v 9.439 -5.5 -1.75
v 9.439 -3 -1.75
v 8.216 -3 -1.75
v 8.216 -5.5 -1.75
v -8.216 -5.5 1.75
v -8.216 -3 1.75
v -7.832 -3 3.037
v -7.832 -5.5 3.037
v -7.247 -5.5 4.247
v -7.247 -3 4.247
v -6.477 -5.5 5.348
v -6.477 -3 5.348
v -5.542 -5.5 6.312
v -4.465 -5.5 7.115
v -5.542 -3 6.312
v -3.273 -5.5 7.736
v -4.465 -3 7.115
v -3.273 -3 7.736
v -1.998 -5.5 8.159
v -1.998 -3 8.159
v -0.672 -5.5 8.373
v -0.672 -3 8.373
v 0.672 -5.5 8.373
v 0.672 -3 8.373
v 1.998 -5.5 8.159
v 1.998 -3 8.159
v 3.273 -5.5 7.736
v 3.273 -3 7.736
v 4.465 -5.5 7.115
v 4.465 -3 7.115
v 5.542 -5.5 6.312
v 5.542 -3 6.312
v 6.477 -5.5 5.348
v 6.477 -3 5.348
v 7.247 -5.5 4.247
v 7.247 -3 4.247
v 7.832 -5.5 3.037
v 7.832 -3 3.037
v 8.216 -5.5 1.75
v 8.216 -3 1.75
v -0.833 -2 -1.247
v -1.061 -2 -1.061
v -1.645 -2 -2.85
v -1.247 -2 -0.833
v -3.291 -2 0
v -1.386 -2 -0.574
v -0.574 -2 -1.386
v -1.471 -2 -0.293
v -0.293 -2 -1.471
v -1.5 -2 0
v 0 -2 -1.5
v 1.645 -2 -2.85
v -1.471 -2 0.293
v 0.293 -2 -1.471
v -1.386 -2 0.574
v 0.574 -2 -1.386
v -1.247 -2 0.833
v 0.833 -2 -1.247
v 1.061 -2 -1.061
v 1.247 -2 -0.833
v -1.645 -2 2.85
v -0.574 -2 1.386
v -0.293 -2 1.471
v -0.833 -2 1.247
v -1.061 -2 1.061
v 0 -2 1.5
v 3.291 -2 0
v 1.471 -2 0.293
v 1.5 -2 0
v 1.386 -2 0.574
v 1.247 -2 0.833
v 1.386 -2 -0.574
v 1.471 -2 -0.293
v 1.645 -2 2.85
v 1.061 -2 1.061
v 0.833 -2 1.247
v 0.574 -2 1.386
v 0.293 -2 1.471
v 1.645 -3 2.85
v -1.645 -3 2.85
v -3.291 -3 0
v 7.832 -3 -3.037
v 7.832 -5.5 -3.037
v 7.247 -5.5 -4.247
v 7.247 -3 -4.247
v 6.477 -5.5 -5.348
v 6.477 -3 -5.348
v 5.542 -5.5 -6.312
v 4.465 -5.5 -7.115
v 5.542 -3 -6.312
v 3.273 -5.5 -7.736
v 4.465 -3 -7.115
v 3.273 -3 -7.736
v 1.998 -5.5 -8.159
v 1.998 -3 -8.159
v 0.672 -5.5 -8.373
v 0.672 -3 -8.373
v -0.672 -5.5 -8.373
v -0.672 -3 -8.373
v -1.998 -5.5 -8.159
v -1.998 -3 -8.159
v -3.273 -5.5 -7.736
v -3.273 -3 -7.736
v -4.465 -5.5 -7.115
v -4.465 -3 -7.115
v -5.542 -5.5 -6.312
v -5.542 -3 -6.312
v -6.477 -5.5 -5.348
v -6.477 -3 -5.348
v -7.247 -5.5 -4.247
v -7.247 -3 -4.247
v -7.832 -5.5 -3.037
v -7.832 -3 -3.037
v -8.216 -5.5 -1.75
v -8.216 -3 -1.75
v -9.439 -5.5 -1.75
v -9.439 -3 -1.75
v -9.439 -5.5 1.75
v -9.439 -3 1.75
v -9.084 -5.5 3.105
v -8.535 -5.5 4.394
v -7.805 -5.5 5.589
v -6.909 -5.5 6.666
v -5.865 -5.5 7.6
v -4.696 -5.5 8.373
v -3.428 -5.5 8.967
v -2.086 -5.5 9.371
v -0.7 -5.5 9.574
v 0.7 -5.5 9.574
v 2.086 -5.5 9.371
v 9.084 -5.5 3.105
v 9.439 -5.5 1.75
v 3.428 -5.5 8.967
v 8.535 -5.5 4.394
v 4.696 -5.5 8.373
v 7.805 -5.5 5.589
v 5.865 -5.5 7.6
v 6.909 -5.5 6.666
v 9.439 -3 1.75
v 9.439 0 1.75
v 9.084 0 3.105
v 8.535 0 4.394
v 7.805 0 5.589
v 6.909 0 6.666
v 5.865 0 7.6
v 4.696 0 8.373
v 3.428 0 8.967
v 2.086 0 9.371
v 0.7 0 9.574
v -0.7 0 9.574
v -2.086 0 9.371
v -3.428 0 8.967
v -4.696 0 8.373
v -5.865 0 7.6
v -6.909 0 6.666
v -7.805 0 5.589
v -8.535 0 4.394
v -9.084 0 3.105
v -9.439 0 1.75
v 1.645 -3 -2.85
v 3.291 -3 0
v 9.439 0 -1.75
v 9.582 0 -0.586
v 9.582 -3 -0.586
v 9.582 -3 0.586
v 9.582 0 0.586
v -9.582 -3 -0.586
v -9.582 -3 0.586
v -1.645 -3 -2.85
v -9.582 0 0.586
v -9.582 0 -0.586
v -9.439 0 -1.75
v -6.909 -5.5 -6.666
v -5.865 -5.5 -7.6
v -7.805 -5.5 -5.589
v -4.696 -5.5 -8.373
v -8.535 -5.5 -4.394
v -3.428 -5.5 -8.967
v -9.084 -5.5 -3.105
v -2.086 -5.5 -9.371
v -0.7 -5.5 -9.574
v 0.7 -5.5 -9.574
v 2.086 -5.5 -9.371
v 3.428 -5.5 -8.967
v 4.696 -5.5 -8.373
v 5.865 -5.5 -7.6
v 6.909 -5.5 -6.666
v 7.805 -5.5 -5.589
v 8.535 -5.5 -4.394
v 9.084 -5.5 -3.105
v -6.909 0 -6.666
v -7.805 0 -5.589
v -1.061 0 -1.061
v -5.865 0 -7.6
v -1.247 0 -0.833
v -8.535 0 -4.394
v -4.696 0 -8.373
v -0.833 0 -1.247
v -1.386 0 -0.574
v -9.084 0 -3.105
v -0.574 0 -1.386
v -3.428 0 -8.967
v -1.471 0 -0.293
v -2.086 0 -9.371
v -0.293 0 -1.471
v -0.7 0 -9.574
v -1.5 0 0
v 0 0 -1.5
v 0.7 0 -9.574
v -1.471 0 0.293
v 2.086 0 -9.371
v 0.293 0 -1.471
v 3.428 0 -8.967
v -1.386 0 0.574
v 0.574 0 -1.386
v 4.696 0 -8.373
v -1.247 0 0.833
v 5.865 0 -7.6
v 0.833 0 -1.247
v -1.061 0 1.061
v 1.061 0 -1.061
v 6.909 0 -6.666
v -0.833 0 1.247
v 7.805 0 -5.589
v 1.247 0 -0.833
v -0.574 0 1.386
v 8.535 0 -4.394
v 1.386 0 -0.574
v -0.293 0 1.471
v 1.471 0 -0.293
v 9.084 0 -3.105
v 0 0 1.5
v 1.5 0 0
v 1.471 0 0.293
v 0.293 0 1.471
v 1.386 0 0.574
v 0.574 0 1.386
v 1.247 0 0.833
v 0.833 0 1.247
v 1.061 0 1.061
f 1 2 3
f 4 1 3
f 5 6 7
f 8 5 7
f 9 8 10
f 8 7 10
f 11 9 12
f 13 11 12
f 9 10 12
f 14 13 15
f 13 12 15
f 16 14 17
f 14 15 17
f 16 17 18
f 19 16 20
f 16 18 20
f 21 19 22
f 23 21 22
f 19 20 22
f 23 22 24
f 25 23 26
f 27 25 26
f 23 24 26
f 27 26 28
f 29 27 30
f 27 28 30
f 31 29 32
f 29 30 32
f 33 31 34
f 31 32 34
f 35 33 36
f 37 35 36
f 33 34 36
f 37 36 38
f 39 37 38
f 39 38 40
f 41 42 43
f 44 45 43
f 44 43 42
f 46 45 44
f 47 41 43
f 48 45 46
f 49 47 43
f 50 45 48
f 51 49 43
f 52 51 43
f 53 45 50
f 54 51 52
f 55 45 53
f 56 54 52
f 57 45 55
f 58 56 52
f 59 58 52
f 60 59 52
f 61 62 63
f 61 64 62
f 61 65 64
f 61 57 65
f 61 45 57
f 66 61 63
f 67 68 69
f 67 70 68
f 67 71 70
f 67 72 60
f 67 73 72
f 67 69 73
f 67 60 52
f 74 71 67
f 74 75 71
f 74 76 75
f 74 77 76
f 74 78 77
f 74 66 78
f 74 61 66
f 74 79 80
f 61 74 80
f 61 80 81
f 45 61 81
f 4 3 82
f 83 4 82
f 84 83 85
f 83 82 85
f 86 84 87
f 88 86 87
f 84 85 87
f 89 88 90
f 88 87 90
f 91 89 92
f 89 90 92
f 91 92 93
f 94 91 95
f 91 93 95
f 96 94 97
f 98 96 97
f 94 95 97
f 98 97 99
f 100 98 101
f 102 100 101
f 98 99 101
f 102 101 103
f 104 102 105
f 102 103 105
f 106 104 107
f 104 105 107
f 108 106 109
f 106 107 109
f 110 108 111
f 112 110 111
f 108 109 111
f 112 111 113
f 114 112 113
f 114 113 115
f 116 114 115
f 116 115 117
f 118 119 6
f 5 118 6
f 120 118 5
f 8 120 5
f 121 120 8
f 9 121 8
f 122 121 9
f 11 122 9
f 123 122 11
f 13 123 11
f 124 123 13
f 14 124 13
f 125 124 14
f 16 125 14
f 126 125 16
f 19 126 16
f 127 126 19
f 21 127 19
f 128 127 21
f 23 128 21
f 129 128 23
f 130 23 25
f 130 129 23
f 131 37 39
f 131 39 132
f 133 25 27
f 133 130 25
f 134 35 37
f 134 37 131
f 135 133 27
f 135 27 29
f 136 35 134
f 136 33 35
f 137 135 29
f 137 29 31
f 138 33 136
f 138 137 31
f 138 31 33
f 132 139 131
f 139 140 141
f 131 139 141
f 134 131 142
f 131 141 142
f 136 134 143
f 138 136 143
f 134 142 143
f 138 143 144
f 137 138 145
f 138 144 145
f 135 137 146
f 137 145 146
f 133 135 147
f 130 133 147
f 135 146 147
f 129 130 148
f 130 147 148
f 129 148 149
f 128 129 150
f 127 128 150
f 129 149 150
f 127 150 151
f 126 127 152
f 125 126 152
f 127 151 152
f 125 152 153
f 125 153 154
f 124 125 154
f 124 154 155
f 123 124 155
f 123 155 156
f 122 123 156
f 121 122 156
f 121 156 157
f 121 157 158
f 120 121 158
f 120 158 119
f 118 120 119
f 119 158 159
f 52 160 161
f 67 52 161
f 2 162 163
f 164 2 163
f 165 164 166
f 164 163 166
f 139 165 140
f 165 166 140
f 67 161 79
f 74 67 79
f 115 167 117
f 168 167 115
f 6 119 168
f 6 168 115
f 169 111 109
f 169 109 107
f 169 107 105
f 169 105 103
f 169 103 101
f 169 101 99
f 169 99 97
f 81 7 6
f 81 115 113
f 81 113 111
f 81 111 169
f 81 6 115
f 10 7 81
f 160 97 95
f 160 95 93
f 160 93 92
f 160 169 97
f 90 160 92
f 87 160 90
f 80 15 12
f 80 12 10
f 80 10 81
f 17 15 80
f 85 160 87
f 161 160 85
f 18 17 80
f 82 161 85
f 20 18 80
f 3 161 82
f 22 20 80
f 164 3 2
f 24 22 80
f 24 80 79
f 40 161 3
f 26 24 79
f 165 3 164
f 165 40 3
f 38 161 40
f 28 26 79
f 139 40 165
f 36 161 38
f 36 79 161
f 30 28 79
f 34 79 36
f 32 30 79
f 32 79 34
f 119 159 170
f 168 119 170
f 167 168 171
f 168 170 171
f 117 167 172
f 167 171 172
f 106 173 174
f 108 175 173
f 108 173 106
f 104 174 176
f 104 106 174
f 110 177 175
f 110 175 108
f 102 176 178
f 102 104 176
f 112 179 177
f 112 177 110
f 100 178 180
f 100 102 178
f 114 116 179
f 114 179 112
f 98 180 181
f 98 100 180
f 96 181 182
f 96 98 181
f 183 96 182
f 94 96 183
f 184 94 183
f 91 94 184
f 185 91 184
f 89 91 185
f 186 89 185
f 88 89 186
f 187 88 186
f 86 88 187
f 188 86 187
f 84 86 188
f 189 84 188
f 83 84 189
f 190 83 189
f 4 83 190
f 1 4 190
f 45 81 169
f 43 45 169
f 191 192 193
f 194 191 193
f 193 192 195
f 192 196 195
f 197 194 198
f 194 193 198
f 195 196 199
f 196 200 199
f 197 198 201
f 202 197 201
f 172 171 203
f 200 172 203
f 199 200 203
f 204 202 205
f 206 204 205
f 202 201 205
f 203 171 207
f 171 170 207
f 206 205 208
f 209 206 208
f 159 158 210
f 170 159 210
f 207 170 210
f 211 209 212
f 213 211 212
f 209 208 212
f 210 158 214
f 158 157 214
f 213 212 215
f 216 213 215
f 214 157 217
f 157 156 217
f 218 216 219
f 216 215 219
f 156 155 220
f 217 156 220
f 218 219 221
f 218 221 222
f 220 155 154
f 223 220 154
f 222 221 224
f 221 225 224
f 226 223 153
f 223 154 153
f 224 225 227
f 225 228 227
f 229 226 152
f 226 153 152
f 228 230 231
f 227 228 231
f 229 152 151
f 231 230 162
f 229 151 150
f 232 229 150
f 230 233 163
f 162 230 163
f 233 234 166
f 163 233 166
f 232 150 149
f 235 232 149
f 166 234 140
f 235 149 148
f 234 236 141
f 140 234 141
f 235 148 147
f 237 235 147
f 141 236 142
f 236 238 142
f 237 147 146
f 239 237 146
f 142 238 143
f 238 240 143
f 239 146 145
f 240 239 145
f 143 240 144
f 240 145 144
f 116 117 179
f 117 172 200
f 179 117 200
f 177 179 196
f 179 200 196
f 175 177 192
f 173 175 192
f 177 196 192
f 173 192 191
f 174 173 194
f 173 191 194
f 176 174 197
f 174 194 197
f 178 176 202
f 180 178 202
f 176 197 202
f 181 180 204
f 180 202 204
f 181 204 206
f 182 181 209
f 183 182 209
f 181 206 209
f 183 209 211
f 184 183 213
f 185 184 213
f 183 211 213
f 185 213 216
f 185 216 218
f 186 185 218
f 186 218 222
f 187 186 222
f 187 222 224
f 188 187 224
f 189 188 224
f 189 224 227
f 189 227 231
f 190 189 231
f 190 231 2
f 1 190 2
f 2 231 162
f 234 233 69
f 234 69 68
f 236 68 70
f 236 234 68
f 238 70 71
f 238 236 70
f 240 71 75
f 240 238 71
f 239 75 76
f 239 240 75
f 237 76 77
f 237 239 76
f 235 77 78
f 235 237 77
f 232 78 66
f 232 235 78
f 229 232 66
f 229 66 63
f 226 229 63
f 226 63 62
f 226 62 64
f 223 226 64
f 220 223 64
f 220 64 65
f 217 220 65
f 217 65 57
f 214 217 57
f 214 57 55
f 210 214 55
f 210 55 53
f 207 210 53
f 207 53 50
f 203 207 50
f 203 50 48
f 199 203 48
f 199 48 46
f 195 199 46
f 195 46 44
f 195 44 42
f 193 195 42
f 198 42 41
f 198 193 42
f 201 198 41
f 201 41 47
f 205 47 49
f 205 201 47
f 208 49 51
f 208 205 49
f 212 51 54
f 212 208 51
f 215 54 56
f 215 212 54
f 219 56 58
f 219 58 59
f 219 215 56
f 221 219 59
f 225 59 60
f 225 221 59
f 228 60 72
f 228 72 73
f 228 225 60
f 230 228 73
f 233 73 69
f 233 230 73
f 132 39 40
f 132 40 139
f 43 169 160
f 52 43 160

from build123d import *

# Parameters (mm, degrees)
F1_DEPTH = 5.5
F0_R     = 1.5
F2_DEPTH = 3
F3_R     = 1.5
F4_DEPTH = 1


with BuildPart() as f1:
    # F0 (on Front) → F1 (new body)
    with BuildSketch(Plane.XZ):
        with BuildLine():
            ThreePointArc((9.4391472072, 1.75), (0, 9.6), (-9.4391472072, 1.75))
            Line((-9.4391472072, 1.75), (-8.215686216, 1.75))
            ThreePointArc((-8.215686216, 1.75), (0, 8.4), (8.215686216, 1.75))
            Line((8.215686216, 1.75), (9.4391472072, 1.75))
        make_face()
    extrude(amount=F1_DEPTH)



with BuildPart() as f1b:
    # F0 (on Front) → F1, piece 2 (new body)
    with BuildSketch(Plane.XZ):
        with BuildLine():
            Line((-8.215686216, -1.75), (-9.4391472072, -1.75))
            ThreePointArc((-9.4391472072, -1.75), (0, -9.6), (9.4391472072, -1.75))
            Line((9.4391472072, -1.75), (8.215686216, -1.75))
            ThreePointArc((8.215686216, -1.75), (0, -8.4), (-8.215686216, -1.75))
        make_face()
    extrude(amount=F1_DEPTH)


with BuildPart() as f1_1:
    add(f1.part)

    add(f1b.part)  # F2 merges F1b
    # F0 (on Front) → F2 (join)
    with BuildSketch(Plane.XZ):
        with BuildLine():
            Line((8.215686216, -1.75), (9.4391472072, -1.75))
            ThreePointArc((9.4391472072, -1.75), (9.6, 0), (9.4391472072, 1.75))
            Line((9.4391472072, 1.75), (8.215686216, 1.75))
            ThreePointArc((8.215686216, 1.75), (8.3537944736, 0.8798396972), (8.4, 0))
            ThreePointArc((8.4, 0), (8.3537944736, -0.8798396972), (8.215686216, -1.75))
        make_face()
        with BuildLine():
            ThreePointArc((-9.4391472072, 1.75), (-9.6, 0), (-9.4391472072, -1.75))
            Line((-9.4391472072, -1.75), (-8.215686216, -1.75))
            ThreePointArc((-8.215686216, -1.75), (-8.4, 0), (-8.215686216, 1.75))
            Line((-8.215686216, 1.75), (-9.4391472072, 1.75))
        make_face()
        with BuildLine():
            ThreePointArc((-8.215686216, 1.75), (-8.4, 0), (-8.215686216, -1.75))
            ThreePointArc((-8.215686216, -1.75), (0, -8.4), (8.215686216, -1.75))
            ThreePointArc((8.215686216, -1.75), (8.3537944736, -0.8798396972), (8.4, 0))
            ThreePointArc((8.4, 0), (8.3537944736, 0.8798396972), (8.215686216, 1.75))
            ThreePointArc((8.215686216, 1.75), (0, 8.4), (-8.215686216, 1.75))
        make_face()
        Circle(F0_R, mode=Mode.SUBTRACT)
    extrude(amount=F2_DEPTH)

    # F3 (on face) → F4 (cut)
    with BuildSketch(Plane.XZ.offset(3)):
        Polygon((1.6454482672, -2.85), (3.2908965344, 0), (1.6454482672, 2.85), (-1.6454482672, 2.85), (-3.2908965344, 0), (-1.6454482672, -2.85), align=None)
        Circle(F3_R, mode=Mode.SUBTRACT)
    extrude(amount=-F4_DEPTH, mode=Mode.SUBTRACT)


solid = f1_1.part
